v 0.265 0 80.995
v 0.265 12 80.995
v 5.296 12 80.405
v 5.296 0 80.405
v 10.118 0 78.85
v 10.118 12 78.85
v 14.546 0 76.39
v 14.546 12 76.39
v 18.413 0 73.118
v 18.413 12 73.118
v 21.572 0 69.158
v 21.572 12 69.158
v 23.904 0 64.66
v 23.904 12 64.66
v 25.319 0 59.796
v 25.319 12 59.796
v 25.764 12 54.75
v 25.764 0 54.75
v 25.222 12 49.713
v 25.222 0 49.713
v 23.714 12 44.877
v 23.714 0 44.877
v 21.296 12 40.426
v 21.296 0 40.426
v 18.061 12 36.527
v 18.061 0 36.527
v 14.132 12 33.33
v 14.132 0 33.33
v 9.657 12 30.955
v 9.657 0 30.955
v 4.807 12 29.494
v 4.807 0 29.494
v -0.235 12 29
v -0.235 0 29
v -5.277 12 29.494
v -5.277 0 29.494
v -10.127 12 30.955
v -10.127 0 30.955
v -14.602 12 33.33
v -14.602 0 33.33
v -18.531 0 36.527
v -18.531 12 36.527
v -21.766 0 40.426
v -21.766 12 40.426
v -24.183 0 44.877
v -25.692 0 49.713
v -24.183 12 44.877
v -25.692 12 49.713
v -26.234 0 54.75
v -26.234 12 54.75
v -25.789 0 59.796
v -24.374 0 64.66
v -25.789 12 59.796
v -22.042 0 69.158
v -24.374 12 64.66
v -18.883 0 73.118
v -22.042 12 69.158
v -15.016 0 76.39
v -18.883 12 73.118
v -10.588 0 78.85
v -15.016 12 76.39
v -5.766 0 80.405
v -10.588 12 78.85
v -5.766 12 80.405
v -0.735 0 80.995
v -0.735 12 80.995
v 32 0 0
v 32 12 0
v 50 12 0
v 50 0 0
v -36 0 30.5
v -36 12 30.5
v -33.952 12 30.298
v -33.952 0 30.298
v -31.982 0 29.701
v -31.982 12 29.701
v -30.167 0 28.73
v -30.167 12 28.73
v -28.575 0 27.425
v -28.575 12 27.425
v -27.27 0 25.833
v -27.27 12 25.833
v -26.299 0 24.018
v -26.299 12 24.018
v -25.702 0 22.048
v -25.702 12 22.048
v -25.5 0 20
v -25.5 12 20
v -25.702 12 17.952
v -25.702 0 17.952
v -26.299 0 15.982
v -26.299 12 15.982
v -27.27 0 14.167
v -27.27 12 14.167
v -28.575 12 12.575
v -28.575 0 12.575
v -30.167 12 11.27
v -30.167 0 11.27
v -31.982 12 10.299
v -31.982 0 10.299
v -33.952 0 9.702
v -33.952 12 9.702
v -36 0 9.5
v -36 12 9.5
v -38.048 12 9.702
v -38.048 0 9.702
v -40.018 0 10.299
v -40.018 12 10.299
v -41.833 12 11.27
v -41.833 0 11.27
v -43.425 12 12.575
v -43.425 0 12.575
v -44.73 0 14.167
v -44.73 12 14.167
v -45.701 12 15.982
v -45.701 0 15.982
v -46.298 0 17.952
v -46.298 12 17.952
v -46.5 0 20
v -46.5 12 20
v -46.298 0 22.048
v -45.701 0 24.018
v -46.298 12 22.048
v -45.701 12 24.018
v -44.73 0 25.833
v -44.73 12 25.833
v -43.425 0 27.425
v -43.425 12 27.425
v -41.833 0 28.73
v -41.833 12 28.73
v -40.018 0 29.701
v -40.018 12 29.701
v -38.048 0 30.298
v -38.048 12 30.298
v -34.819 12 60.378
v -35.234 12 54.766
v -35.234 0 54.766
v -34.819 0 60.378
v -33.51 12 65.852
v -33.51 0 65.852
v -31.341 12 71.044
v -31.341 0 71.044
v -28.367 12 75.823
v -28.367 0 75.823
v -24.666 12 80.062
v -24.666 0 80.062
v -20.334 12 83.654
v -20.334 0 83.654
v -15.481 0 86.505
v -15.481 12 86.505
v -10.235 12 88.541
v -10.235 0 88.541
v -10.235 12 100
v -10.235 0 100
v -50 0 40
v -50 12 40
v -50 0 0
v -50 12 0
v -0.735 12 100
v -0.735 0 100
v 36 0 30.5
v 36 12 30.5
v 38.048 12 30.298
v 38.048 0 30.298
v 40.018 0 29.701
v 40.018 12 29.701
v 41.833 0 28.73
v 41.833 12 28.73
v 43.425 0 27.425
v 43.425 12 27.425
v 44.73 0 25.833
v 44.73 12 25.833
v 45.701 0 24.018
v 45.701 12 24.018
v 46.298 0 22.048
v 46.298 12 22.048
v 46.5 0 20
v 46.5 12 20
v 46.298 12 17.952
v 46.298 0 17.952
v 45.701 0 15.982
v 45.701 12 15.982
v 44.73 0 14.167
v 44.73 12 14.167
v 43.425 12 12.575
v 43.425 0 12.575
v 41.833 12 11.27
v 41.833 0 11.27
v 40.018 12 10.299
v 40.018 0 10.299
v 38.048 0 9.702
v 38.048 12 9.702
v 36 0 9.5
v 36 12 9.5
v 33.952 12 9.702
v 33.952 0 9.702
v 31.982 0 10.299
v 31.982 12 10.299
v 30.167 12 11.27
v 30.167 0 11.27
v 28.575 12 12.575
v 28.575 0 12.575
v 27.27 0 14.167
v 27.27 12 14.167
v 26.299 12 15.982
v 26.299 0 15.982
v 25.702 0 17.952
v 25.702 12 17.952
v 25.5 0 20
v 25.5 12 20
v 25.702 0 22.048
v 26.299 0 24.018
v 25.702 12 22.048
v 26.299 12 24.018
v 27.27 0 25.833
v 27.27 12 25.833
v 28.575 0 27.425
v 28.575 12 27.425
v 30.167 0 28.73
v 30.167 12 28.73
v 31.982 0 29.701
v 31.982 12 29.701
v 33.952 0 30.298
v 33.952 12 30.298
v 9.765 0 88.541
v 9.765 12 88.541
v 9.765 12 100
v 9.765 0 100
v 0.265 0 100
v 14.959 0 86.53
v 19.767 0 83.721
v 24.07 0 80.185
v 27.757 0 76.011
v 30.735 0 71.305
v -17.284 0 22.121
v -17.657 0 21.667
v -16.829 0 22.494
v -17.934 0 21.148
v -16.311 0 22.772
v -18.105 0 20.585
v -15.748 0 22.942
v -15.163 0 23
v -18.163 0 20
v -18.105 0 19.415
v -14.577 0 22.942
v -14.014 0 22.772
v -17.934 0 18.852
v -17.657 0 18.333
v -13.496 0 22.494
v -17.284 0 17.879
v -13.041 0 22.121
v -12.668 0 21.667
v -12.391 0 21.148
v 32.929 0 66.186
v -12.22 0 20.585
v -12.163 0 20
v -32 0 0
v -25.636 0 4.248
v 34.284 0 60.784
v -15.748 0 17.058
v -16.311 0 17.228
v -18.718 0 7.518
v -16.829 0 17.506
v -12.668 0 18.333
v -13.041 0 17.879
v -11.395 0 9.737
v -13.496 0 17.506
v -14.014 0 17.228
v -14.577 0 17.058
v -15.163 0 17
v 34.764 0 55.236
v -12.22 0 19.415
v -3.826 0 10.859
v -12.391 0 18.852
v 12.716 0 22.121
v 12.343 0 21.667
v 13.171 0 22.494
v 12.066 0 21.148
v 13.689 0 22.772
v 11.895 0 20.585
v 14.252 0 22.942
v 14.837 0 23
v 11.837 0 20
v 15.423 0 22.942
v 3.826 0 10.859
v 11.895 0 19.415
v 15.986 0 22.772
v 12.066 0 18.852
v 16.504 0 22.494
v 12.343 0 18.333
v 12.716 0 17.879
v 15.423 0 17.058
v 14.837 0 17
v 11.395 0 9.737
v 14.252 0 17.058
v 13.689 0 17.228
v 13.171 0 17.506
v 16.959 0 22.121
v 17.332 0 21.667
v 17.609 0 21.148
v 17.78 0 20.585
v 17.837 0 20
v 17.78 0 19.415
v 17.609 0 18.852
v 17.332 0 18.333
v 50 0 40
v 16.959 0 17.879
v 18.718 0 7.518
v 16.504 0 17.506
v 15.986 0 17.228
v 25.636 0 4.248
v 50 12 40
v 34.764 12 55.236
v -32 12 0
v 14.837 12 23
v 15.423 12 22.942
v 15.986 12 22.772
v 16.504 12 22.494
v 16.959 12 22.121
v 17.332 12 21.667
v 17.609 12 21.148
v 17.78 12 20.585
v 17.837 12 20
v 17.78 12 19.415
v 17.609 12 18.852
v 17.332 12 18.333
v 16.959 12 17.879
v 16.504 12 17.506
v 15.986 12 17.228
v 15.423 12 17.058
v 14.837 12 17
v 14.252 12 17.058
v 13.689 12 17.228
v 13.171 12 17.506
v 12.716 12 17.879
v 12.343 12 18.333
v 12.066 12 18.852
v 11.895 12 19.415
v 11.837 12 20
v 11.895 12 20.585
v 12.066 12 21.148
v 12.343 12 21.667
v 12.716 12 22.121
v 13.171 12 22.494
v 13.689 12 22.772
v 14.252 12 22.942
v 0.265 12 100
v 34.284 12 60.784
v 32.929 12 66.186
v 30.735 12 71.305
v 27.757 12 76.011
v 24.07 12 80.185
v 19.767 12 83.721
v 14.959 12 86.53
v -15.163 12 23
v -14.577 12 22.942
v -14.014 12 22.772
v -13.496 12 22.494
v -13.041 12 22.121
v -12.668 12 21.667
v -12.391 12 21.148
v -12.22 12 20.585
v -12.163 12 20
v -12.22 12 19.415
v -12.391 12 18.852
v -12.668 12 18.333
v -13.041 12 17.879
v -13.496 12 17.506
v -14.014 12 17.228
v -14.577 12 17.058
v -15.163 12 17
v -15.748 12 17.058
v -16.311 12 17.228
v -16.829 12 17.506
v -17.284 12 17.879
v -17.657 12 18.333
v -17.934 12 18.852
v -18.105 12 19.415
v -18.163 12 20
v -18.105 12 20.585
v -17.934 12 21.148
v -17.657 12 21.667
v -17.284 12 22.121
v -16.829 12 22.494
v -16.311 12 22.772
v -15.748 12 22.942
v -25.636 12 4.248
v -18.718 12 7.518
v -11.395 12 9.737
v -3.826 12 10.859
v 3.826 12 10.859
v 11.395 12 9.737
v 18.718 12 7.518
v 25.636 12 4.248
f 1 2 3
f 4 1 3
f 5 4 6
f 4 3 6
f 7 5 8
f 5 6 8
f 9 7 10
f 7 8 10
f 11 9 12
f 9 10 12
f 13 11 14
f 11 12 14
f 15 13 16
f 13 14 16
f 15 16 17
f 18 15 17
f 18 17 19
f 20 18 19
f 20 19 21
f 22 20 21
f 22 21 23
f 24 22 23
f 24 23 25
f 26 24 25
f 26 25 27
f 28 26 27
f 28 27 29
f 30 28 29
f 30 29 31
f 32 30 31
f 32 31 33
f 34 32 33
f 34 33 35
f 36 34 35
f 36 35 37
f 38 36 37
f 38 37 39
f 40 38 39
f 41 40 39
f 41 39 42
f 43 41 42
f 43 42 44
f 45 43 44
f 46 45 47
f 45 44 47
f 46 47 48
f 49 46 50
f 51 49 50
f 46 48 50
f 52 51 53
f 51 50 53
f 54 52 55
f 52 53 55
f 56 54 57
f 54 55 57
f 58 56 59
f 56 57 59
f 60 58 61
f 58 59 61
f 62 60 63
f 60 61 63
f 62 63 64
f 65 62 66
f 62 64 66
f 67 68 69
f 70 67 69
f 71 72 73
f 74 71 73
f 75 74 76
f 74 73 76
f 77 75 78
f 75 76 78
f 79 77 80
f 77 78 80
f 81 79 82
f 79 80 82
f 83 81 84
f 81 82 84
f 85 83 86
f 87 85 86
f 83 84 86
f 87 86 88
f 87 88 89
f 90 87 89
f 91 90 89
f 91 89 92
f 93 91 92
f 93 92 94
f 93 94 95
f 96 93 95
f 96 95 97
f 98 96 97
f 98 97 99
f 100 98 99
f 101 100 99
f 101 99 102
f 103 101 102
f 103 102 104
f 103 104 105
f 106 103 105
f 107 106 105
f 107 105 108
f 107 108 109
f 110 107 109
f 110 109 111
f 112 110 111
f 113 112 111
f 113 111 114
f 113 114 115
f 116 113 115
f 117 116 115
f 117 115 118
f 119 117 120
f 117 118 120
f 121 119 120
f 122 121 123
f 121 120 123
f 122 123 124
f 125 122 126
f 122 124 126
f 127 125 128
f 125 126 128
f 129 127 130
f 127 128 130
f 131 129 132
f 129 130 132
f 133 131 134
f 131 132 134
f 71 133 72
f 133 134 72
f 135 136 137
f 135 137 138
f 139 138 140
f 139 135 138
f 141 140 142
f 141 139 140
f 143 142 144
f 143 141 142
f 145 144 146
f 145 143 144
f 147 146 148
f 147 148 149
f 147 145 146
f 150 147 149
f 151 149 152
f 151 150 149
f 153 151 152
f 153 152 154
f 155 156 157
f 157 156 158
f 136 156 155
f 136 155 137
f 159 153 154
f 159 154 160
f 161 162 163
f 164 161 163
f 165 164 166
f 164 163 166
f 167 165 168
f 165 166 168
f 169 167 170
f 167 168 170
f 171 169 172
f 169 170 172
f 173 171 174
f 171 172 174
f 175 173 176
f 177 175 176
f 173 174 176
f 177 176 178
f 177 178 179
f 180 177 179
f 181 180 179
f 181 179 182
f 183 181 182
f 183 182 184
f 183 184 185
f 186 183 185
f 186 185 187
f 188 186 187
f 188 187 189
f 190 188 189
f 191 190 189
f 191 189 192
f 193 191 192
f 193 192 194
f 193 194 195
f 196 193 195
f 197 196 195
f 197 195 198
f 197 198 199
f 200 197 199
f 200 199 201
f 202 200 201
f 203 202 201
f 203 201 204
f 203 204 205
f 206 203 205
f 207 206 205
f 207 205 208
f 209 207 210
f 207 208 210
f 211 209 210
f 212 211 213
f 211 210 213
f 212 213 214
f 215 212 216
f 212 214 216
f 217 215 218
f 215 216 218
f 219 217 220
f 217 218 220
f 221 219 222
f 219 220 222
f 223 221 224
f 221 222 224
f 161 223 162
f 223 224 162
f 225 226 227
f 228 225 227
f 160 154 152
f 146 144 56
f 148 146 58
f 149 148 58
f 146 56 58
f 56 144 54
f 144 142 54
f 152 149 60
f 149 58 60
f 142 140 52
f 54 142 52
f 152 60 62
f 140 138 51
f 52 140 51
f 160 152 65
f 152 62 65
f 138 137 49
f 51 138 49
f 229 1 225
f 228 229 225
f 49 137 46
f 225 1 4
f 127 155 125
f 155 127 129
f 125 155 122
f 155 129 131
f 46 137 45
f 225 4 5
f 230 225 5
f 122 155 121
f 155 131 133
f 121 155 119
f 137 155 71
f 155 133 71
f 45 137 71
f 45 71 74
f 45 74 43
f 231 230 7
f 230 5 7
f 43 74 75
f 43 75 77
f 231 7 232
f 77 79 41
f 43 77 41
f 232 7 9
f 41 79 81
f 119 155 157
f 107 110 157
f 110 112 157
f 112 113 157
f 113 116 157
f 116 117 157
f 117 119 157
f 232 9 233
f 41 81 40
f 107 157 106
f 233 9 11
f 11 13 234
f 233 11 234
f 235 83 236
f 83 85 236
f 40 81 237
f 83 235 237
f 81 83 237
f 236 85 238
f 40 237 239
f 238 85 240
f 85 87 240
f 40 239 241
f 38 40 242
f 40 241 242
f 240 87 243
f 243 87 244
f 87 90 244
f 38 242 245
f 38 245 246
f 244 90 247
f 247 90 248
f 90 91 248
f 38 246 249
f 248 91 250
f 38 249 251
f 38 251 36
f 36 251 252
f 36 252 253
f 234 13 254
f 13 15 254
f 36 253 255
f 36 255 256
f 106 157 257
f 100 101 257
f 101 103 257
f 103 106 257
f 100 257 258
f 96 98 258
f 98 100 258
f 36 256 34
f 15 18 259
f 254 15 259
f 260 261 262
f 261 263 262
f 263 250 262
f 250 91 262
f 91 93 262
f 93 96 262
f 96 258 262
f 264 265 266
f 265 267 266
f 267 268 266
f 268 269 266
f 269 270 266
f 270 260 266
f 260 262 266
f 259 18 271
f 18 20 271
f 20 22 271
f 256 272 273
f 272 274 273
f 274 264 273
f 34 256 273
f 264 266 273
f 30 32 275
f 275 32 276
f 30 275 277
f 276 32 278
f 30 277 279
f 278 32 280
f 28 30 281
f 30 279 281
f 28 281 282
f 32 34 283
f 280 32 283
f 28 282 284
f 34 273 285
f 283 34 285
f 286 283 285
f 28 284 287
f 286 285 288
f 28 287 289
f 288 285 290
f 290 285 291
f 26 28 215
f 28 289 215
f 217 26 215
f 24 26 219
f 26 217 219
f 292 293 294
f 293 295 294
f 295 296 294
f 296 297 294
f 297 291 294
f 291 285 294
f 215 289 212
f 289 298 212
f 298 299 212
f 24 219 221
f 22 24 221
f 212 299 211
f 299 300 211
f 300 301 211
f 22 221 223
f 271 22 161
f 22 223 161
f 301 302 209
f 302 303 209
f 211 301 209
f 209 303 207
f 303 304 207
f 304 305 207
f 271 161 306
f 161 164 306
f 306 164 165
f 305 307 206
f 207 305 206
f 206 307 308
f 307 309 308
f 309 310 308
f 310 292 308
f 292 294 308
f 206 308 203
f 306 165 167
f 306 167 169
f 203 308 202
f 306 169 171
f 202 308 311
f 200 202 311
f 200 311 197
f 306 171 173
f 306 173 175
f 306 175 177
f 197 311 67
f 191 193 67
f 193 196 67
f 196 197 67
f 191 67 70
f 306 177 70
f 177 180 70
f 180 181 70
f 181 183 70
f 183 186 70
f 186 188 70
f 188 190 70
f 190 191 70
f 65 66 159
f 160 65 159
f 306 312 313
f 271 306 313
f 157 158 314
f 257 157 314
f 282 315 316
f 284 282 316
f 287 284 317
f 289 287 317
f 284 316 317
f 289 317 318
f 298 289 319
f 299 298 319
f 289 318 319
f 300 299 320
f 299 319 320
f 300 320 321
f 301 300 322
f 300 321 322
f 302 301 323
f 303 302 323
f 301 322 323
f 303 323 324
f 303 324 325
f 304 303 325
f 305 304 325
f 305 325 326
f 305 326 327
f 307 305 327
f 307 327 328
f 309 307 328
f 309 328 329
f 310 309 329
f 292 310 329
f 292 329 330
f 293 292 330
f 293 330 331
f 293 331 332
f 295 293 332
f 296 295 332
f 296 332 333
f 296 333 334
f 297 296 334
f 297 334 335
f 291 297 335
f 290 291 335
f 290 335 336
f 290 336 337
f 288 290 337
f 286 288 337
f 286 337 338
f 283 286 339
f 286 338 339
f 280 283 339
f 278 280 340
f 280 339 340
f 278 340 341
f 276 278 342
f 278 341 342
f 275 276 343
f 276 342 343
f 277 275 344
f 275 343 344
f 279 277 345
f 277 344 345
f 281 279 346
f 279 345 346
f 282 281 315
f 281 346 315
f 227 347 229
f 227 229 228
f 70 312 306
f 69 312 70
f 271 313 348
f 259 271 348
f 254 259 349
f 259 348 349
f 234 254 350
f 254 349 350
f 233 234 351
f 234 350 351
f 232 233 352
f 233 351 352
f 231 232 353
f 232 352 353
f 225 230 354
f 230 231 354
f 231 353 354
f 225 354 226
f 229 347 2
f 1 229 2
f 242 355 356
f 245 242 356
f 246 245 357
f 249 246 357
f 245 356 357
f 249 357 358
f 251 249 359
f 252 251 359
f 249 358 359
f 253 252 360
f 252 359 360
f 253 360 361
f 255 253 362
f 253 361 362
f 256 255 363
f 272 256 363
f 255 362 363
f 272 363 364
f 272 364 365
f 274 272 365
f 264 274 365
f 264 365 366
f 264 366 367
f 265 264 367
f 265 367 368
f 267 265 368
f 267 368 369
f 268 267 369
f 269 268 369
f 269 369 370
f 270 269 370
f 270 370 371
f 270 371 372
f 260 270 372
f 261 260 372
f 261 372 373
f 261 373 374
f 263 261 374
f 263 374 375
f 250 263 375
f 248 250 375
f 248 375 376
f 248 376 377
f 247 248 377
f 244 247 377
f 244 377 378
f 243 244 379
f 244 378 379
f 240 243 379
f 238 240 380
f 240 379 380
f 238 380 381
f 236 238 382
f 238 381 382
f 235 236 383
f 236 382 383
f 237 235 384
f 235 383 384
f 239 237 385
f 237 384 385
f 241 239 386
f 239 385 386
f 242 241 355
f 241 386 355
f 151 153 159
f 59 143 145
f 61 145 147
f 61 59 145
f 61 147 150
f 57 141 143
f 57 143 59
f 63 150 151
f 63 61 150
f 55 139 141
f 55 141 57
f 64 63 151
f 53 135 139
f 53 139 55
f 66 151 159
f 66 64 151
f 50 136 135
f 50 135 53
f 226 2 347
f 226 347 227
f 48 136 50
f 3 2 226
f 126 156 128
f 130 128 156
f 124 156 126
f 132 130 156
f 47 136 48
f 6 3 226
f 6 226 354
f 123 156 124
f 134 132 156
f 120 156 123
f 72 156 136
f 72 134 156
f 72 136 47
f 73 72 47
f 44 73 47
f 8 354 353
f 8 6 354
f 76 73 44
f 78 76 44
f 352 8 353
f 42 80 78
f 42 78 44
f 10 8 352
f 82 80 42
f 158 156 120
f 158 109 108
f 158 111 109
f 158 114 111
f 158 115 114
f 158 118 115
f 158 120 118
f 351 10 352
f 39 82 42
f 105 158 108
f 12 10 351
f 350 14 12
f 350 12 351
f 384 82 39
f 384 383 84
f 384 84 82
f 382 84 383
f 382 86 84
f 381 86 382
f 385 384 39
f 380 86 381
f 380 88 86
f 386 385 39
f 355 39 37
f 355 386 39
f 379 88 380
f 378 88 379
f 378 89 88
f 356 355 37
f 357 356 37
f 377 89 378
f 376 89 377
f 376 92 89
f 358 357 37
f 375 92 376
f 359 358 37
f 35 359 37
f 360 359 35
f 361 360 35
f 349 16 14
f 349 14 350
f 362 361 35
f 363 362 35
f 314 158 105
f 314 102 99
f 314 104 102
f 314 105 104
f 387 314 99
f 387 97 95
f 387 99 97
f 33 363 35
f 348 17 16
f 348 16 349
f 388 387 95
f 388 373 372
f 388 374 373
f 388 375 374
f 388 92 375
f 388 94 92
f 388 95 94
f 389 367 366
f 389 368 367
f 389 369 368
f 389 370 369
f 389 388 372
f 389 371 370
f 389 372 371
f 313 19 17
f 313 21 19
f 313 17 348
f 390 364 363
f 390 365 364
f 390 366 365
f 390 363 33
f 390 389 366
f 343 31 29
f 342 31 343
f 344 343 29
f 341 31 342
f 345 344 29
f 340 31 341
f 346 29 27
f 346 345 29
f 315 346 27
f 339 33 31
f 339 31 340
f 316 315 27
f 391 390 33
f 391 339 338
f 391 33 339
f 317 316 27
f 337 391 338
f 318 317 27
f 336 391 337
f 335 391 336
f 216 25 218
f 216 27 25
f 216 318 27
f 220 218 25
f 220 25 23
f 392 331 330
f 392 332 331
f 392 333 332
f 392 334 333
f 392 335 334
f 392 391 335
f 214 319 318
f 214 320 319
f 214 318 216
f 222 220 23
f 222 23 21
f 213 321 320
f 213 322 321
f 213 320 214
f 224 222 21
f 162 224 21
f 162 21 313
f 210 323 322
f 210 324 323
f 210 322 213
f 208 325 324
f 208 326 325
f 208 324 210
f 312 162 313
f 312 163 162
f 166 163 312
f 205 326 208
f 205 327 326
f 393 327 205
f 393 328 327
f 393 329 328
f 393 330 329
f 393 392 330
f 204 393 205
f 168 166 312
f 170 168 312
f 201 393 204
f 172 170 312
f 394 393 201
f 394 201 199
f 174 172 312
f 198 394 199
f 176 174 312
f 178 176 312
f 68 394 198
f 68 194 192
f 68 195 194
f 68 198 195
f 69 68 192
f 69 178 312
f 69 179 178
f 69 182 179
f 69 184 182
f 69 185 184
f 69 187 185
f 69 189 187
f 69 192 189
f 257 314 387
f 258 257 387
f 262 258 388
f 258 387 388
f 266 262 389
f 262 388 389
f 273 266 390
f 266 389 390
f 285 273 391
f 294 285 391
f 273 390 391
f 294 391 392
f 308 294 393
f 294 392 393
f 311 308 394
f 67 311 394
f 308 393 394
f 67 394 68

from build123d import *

# Parameters (mm, degrees)
SKETCH1_W           = 100
SKETCH1_H           = 100
SKETCH1_R           = 11
BOSS_EXTRUDE1_DEPTH = 12
SKETCH9_W           = 100
SKETCH9_H           = 50
BOSS_EXTRUDE3_DEPTH = 12
CUT_EXTRUDE3_REACH  = 114.446
SKETCH4_R           = 10.5
CUT_EXTRUDE4_REACH  = 114.446
CUT_EXTRUDE5_REACH  = 114.446
SKETCH6_R           = 26
CUT_EXTRUDE6_REACH  = 114.446
CUT_EXTRUDE7_REACH  = 114.446
SKETCH11_R          = 52.045454545
CUT_EXTRUDE8_REACH  = 114.446
SKETCH12_R          = 3


with BuildPart() as part:
    # Sketch1 → Boss-Extrude1 (new body)
    with BuildSketch(Plane(origin=(0, 0, 0), x_dir=(1, 0, 0), z_dir=(0, 1, 0))):
        Rectangle(SKETCH1_W, SKETCH1_H)
        with Locations(Location((0, 0, 0), (0, 0, 270))):
            Circle(SKETCH1_R, mode=Mode.SUBTRACT)
    extrude(amount=BOSS_EXTRUDE1_DEPTH)

    # Sketch9 → Boss-Extrude3 (add)
    with BuildSketch(Plane(origin=(0, 12, 0), x_dir=(1, 0, 0), z_dir=(0, 1, 0))):
        with Locations((0, -75)):
            Rectangle(SKETCH9_W, SKETCH9_H)
    extrude(amount=-BOSS_EXTRUDE3_DEPTH)

    # Sketch4 → Cut-Extrude3 (cut, up to next)
    with BuildSketch(Plane(origin=(0, 12, 0), x_dir=(1, 0, 0), z_dir=(0, 1, 0)), mode=Mode.PRIVATE) as cut_extrude3_sk1:
        with Locations(Location((-36, -20, 0), (0, 0, 270))):
            Circle(SKETCH4_R)
    cut_extrude3_tool1 = extrude(cut_extrude3_sk1.sketch, amount=-CUT_EXTRUDE3_REACH, mode=Mode.PRIVATE) & part.part
    # Sketch4 → Cut-Extrude3 (cut, up to next)
    with BuildSketch(Plane(origin=(0, 12, 0), x_dir=(1, 0, 0), z_dir=(0, 1, 0)), mode=Mode.PRIVATE) as cut_extrude3_sk2:
        with Locations(Location((36, -20, 0), (0, 0, 270))):
            Circle(SKETCH4_R)
    cut_extrude3_tool2 = extrude(cut_extrude3_sk2.sketch, amount=-CUT_EXTRUDE3_REACH, mode=Mode.PRIVATE) & part.part
    add(cut_extrude3_tool1.solids().sort_by_distance((-36, 12, 20))[0], mode=Mode.SUBTRACT)
    add(cut_extrude3_tool2.solids().sort_by_distance((36, 12, 20))[0], mode=Mode.SUBTRACT)

    # Sketch5 → Cut-Extrude4 (cut, up to next)
    with BuildSketch(Plane(origin=(0, 12, 0), x_dir=(1, 0, 0), z_dir=(0, 1, 0)), mode=Mode.PRIVATE) as cut_extrude4_sk1:
        Polygon((-50, 0), (-32, 0), (-32, 18), (32, 18), (32, 0), (50, 0), (50, 50), (-50, 50), align=None)
    cut_extrude4_tool1 = extrude(cut_extrude4_sk1.sketch, amount=-CUT_EXTRUDE4_REACH, mode=Mode.PRIVATE) & part.part
    add(cut_extrude4_tool1.solids().sort_by_distance((0, 12, -29.790021))[0], mode=Mode.SUBTRACT)

    # Sketch6 → Cut-Extrude5 (cut, up to next)
    with BuildSketch(Plane(origin=(0, 12, 0), x_dir=(1, 0, 0), z_dir=(0, 1, 0)), mode=Mode.PRIVATE) as cut_extrude5_sk1:
        with Locations(Location((-0.234960822, -55, 0), (0, 0, 270))):
            Circle(SKETCH6_R)
    cut_extrude5_tool1 = extrude(cut_extrude5_sk1.sketch, amount=-CUT_EXTRUDE5_REACH, mode=Mode.PRIVATE) & part.part
    add(cut_extrude5_tool1.solids().sort_by_distance((-0.234961, 12, 55))[0], mode=Mode.SUBTRACT)

    # Sketch10 → Cut-Extrude6 (cut, up to next)
    with BuildSketch(Plane(origin=(0, 12, 0), x_dir=(1, 0, 0), z_dir=(0, 1, 0)), mode=Mode.PRIVATE) as cut_extrude6_sk1:
        with BuildLine():
            Line((-10.234960822, -88.541019662), (-10.234960822, -100))
            Line((-10.234960822, -100), (-50, -100))
            Line((-50, -100), (-50, -40))
            Line((-50, -40), (-35.234177398, -54.765822602))
            ThreePointArc((-35.234177398, -54.765822602), (-28.367208461, -75.822503278), (-10.234960822, -88.541019662))
        make_face()
    cut_extrude6_tool1 = extrude(cut_extrude6_sk1.sketch, amount=-CUT_EXTRUDE6_REACH, mode=Mode.PRIVATE) & part.part
    # Sketch10 → Cut-Extrude6 (cut, up to next)
    with BuildSketch(Plane(origin=(0, 12, 0), x_dir=(1, 0, 0), z_dir=(0, 1, 0)), mode=Mode.PRIVATE) as cut_extrude6_sk2:
        with BuildLine():
            Line((9.765039178, -88.541019662), (9.765039178, -100))
            Line((9.765039178, -100), (50, -100))
            Line((50, -100), (50, -40))
            Line((50, -40), (34.764245164, -55.235754836))
            ThreePointArc((34.764245164, -55.235754836), (27.756864791, -76.010894766), (9.765039178, -88.541019662))
        make_face()
    cut_extrude6_tool2 = extrude(cut_extrude6_sk2.sketch, amount=-CUT_EXTRUDE6_REACH, mode=Mode.PRIVATE) & part.part
    # Sketch10 → Cut-Extrude6 (cut, up to next)
    with BuildSketch(Plane(origin=(0, 12, 0), x_dir=(1, 0, 0), z_dir=(0, 1, 0)), mode=Mode.PRIVATE) as cut_extrude6_sk3:
        with BuildLine():
            Line((-0.734960822, -80.995191863), (-0.734960822, -100))
            Line((-0.734960822, -100), (0.265039178, -100))
            Line((0.265039178, -100), (0.265039178, -80.995191863))
            ThreePointArc((0.265039178, -80.995191863), (-0.234960822, -81), (-0.734960822, -80.995191863))
        make_face()
    cut_extrude6_tool3 = extrude(cut_extrude6_sk3.sketch, amount=-CUT_EXTRUDE6_REACH, mode=Mode.PRIVATE) & part.part
    add(cut_extrude6_tool1.solids().sort_by_distance((-35.978986, 12, 79.410224))[0], mode=Mode.SUBTRACT)
    add(cut_extrude6_tool2.solids().sort_by_distance((35.780347, 12, 79.379296))[0], mode=Mode.SUBTRACT)
    add(cut_extrude6_tool3.solids().sort_by_distance((-0.234961, 12, 90.499199))[0], mode=Mode.SUBTRACT)

    # Sketch11 → Cut-Extrude7 (cut, up to next)
    with BuildSketch(Plane(origin=(0, 12, 0), x_dir=(1, 0, 0), z_dir=(0, 1, 0)), mode=Mode.PRIVATE) as cut_extrude7_sk1:
        with Locations((0, 41.045454545)):
            Circle(SKETCH11_R)
    cut_extrude7_tool1 = extrude(cut_extrude7_sk1.sketch, amount=-CUT_EXTRUDE7_REACH, mode=Mode.PRIVATE) & part.part
    add(cut_extrude7_tool1.solids().sort_by_distance((0, 12, -41.045455))[0], mode=Mode.SUBTRACT)

    # Sketch12 → Cut-Extrude8 (cut, up to next)
    with BuildSketch(Plane(origin=(0, 12, 0), x_dir=(1, 0, 0), z_dir=(0, 1, 0)), mode=Mode.PRIVATE) as cut_extrude8_sk1:
        with Locations(Location((-15.162534268, -20, 0), (0, 0, 270))):
            Circle(SKETCH12_R)
    cut_extrude8_tool1 = extrude(cut_extrude8_sk1.sketch, amount=-CUT_EXTRUDE8_REACH, mode=Mode.PRIVATE) & part.part
    # Sketch12 → Cut-Extrude8 (cut, up to next)
    with BuildSketch(Plane(origin=(0, 12, 0), x_dir=(1, 0, 0), z_dir=(0, 1, 0)), mode=Mode.PRIVATE) as cut_extrude8_sk2:
        with Locations(Location((14.837465732, -20, 0), (0, 0, 270))):
            Circle(SKETCH12_R)
    cut_extrude8_tool2 = extrude(cut_extrude8_sk2.sketch, amount=-CUT_EXTRUDE8_REACH, mode=Mode.PRIVATE) & part.part
    add(cut_extrude8_tool1.solids().sort_by_distance((-15.162534, 12, 20))[0], mode=Mode.SUBTRACT)
    add(cut_extrude8_tool2.solids().sort_by_distance((14.837466, 12, 20))[0], mode=Mode.SUBTRACT)


solid = part.part
